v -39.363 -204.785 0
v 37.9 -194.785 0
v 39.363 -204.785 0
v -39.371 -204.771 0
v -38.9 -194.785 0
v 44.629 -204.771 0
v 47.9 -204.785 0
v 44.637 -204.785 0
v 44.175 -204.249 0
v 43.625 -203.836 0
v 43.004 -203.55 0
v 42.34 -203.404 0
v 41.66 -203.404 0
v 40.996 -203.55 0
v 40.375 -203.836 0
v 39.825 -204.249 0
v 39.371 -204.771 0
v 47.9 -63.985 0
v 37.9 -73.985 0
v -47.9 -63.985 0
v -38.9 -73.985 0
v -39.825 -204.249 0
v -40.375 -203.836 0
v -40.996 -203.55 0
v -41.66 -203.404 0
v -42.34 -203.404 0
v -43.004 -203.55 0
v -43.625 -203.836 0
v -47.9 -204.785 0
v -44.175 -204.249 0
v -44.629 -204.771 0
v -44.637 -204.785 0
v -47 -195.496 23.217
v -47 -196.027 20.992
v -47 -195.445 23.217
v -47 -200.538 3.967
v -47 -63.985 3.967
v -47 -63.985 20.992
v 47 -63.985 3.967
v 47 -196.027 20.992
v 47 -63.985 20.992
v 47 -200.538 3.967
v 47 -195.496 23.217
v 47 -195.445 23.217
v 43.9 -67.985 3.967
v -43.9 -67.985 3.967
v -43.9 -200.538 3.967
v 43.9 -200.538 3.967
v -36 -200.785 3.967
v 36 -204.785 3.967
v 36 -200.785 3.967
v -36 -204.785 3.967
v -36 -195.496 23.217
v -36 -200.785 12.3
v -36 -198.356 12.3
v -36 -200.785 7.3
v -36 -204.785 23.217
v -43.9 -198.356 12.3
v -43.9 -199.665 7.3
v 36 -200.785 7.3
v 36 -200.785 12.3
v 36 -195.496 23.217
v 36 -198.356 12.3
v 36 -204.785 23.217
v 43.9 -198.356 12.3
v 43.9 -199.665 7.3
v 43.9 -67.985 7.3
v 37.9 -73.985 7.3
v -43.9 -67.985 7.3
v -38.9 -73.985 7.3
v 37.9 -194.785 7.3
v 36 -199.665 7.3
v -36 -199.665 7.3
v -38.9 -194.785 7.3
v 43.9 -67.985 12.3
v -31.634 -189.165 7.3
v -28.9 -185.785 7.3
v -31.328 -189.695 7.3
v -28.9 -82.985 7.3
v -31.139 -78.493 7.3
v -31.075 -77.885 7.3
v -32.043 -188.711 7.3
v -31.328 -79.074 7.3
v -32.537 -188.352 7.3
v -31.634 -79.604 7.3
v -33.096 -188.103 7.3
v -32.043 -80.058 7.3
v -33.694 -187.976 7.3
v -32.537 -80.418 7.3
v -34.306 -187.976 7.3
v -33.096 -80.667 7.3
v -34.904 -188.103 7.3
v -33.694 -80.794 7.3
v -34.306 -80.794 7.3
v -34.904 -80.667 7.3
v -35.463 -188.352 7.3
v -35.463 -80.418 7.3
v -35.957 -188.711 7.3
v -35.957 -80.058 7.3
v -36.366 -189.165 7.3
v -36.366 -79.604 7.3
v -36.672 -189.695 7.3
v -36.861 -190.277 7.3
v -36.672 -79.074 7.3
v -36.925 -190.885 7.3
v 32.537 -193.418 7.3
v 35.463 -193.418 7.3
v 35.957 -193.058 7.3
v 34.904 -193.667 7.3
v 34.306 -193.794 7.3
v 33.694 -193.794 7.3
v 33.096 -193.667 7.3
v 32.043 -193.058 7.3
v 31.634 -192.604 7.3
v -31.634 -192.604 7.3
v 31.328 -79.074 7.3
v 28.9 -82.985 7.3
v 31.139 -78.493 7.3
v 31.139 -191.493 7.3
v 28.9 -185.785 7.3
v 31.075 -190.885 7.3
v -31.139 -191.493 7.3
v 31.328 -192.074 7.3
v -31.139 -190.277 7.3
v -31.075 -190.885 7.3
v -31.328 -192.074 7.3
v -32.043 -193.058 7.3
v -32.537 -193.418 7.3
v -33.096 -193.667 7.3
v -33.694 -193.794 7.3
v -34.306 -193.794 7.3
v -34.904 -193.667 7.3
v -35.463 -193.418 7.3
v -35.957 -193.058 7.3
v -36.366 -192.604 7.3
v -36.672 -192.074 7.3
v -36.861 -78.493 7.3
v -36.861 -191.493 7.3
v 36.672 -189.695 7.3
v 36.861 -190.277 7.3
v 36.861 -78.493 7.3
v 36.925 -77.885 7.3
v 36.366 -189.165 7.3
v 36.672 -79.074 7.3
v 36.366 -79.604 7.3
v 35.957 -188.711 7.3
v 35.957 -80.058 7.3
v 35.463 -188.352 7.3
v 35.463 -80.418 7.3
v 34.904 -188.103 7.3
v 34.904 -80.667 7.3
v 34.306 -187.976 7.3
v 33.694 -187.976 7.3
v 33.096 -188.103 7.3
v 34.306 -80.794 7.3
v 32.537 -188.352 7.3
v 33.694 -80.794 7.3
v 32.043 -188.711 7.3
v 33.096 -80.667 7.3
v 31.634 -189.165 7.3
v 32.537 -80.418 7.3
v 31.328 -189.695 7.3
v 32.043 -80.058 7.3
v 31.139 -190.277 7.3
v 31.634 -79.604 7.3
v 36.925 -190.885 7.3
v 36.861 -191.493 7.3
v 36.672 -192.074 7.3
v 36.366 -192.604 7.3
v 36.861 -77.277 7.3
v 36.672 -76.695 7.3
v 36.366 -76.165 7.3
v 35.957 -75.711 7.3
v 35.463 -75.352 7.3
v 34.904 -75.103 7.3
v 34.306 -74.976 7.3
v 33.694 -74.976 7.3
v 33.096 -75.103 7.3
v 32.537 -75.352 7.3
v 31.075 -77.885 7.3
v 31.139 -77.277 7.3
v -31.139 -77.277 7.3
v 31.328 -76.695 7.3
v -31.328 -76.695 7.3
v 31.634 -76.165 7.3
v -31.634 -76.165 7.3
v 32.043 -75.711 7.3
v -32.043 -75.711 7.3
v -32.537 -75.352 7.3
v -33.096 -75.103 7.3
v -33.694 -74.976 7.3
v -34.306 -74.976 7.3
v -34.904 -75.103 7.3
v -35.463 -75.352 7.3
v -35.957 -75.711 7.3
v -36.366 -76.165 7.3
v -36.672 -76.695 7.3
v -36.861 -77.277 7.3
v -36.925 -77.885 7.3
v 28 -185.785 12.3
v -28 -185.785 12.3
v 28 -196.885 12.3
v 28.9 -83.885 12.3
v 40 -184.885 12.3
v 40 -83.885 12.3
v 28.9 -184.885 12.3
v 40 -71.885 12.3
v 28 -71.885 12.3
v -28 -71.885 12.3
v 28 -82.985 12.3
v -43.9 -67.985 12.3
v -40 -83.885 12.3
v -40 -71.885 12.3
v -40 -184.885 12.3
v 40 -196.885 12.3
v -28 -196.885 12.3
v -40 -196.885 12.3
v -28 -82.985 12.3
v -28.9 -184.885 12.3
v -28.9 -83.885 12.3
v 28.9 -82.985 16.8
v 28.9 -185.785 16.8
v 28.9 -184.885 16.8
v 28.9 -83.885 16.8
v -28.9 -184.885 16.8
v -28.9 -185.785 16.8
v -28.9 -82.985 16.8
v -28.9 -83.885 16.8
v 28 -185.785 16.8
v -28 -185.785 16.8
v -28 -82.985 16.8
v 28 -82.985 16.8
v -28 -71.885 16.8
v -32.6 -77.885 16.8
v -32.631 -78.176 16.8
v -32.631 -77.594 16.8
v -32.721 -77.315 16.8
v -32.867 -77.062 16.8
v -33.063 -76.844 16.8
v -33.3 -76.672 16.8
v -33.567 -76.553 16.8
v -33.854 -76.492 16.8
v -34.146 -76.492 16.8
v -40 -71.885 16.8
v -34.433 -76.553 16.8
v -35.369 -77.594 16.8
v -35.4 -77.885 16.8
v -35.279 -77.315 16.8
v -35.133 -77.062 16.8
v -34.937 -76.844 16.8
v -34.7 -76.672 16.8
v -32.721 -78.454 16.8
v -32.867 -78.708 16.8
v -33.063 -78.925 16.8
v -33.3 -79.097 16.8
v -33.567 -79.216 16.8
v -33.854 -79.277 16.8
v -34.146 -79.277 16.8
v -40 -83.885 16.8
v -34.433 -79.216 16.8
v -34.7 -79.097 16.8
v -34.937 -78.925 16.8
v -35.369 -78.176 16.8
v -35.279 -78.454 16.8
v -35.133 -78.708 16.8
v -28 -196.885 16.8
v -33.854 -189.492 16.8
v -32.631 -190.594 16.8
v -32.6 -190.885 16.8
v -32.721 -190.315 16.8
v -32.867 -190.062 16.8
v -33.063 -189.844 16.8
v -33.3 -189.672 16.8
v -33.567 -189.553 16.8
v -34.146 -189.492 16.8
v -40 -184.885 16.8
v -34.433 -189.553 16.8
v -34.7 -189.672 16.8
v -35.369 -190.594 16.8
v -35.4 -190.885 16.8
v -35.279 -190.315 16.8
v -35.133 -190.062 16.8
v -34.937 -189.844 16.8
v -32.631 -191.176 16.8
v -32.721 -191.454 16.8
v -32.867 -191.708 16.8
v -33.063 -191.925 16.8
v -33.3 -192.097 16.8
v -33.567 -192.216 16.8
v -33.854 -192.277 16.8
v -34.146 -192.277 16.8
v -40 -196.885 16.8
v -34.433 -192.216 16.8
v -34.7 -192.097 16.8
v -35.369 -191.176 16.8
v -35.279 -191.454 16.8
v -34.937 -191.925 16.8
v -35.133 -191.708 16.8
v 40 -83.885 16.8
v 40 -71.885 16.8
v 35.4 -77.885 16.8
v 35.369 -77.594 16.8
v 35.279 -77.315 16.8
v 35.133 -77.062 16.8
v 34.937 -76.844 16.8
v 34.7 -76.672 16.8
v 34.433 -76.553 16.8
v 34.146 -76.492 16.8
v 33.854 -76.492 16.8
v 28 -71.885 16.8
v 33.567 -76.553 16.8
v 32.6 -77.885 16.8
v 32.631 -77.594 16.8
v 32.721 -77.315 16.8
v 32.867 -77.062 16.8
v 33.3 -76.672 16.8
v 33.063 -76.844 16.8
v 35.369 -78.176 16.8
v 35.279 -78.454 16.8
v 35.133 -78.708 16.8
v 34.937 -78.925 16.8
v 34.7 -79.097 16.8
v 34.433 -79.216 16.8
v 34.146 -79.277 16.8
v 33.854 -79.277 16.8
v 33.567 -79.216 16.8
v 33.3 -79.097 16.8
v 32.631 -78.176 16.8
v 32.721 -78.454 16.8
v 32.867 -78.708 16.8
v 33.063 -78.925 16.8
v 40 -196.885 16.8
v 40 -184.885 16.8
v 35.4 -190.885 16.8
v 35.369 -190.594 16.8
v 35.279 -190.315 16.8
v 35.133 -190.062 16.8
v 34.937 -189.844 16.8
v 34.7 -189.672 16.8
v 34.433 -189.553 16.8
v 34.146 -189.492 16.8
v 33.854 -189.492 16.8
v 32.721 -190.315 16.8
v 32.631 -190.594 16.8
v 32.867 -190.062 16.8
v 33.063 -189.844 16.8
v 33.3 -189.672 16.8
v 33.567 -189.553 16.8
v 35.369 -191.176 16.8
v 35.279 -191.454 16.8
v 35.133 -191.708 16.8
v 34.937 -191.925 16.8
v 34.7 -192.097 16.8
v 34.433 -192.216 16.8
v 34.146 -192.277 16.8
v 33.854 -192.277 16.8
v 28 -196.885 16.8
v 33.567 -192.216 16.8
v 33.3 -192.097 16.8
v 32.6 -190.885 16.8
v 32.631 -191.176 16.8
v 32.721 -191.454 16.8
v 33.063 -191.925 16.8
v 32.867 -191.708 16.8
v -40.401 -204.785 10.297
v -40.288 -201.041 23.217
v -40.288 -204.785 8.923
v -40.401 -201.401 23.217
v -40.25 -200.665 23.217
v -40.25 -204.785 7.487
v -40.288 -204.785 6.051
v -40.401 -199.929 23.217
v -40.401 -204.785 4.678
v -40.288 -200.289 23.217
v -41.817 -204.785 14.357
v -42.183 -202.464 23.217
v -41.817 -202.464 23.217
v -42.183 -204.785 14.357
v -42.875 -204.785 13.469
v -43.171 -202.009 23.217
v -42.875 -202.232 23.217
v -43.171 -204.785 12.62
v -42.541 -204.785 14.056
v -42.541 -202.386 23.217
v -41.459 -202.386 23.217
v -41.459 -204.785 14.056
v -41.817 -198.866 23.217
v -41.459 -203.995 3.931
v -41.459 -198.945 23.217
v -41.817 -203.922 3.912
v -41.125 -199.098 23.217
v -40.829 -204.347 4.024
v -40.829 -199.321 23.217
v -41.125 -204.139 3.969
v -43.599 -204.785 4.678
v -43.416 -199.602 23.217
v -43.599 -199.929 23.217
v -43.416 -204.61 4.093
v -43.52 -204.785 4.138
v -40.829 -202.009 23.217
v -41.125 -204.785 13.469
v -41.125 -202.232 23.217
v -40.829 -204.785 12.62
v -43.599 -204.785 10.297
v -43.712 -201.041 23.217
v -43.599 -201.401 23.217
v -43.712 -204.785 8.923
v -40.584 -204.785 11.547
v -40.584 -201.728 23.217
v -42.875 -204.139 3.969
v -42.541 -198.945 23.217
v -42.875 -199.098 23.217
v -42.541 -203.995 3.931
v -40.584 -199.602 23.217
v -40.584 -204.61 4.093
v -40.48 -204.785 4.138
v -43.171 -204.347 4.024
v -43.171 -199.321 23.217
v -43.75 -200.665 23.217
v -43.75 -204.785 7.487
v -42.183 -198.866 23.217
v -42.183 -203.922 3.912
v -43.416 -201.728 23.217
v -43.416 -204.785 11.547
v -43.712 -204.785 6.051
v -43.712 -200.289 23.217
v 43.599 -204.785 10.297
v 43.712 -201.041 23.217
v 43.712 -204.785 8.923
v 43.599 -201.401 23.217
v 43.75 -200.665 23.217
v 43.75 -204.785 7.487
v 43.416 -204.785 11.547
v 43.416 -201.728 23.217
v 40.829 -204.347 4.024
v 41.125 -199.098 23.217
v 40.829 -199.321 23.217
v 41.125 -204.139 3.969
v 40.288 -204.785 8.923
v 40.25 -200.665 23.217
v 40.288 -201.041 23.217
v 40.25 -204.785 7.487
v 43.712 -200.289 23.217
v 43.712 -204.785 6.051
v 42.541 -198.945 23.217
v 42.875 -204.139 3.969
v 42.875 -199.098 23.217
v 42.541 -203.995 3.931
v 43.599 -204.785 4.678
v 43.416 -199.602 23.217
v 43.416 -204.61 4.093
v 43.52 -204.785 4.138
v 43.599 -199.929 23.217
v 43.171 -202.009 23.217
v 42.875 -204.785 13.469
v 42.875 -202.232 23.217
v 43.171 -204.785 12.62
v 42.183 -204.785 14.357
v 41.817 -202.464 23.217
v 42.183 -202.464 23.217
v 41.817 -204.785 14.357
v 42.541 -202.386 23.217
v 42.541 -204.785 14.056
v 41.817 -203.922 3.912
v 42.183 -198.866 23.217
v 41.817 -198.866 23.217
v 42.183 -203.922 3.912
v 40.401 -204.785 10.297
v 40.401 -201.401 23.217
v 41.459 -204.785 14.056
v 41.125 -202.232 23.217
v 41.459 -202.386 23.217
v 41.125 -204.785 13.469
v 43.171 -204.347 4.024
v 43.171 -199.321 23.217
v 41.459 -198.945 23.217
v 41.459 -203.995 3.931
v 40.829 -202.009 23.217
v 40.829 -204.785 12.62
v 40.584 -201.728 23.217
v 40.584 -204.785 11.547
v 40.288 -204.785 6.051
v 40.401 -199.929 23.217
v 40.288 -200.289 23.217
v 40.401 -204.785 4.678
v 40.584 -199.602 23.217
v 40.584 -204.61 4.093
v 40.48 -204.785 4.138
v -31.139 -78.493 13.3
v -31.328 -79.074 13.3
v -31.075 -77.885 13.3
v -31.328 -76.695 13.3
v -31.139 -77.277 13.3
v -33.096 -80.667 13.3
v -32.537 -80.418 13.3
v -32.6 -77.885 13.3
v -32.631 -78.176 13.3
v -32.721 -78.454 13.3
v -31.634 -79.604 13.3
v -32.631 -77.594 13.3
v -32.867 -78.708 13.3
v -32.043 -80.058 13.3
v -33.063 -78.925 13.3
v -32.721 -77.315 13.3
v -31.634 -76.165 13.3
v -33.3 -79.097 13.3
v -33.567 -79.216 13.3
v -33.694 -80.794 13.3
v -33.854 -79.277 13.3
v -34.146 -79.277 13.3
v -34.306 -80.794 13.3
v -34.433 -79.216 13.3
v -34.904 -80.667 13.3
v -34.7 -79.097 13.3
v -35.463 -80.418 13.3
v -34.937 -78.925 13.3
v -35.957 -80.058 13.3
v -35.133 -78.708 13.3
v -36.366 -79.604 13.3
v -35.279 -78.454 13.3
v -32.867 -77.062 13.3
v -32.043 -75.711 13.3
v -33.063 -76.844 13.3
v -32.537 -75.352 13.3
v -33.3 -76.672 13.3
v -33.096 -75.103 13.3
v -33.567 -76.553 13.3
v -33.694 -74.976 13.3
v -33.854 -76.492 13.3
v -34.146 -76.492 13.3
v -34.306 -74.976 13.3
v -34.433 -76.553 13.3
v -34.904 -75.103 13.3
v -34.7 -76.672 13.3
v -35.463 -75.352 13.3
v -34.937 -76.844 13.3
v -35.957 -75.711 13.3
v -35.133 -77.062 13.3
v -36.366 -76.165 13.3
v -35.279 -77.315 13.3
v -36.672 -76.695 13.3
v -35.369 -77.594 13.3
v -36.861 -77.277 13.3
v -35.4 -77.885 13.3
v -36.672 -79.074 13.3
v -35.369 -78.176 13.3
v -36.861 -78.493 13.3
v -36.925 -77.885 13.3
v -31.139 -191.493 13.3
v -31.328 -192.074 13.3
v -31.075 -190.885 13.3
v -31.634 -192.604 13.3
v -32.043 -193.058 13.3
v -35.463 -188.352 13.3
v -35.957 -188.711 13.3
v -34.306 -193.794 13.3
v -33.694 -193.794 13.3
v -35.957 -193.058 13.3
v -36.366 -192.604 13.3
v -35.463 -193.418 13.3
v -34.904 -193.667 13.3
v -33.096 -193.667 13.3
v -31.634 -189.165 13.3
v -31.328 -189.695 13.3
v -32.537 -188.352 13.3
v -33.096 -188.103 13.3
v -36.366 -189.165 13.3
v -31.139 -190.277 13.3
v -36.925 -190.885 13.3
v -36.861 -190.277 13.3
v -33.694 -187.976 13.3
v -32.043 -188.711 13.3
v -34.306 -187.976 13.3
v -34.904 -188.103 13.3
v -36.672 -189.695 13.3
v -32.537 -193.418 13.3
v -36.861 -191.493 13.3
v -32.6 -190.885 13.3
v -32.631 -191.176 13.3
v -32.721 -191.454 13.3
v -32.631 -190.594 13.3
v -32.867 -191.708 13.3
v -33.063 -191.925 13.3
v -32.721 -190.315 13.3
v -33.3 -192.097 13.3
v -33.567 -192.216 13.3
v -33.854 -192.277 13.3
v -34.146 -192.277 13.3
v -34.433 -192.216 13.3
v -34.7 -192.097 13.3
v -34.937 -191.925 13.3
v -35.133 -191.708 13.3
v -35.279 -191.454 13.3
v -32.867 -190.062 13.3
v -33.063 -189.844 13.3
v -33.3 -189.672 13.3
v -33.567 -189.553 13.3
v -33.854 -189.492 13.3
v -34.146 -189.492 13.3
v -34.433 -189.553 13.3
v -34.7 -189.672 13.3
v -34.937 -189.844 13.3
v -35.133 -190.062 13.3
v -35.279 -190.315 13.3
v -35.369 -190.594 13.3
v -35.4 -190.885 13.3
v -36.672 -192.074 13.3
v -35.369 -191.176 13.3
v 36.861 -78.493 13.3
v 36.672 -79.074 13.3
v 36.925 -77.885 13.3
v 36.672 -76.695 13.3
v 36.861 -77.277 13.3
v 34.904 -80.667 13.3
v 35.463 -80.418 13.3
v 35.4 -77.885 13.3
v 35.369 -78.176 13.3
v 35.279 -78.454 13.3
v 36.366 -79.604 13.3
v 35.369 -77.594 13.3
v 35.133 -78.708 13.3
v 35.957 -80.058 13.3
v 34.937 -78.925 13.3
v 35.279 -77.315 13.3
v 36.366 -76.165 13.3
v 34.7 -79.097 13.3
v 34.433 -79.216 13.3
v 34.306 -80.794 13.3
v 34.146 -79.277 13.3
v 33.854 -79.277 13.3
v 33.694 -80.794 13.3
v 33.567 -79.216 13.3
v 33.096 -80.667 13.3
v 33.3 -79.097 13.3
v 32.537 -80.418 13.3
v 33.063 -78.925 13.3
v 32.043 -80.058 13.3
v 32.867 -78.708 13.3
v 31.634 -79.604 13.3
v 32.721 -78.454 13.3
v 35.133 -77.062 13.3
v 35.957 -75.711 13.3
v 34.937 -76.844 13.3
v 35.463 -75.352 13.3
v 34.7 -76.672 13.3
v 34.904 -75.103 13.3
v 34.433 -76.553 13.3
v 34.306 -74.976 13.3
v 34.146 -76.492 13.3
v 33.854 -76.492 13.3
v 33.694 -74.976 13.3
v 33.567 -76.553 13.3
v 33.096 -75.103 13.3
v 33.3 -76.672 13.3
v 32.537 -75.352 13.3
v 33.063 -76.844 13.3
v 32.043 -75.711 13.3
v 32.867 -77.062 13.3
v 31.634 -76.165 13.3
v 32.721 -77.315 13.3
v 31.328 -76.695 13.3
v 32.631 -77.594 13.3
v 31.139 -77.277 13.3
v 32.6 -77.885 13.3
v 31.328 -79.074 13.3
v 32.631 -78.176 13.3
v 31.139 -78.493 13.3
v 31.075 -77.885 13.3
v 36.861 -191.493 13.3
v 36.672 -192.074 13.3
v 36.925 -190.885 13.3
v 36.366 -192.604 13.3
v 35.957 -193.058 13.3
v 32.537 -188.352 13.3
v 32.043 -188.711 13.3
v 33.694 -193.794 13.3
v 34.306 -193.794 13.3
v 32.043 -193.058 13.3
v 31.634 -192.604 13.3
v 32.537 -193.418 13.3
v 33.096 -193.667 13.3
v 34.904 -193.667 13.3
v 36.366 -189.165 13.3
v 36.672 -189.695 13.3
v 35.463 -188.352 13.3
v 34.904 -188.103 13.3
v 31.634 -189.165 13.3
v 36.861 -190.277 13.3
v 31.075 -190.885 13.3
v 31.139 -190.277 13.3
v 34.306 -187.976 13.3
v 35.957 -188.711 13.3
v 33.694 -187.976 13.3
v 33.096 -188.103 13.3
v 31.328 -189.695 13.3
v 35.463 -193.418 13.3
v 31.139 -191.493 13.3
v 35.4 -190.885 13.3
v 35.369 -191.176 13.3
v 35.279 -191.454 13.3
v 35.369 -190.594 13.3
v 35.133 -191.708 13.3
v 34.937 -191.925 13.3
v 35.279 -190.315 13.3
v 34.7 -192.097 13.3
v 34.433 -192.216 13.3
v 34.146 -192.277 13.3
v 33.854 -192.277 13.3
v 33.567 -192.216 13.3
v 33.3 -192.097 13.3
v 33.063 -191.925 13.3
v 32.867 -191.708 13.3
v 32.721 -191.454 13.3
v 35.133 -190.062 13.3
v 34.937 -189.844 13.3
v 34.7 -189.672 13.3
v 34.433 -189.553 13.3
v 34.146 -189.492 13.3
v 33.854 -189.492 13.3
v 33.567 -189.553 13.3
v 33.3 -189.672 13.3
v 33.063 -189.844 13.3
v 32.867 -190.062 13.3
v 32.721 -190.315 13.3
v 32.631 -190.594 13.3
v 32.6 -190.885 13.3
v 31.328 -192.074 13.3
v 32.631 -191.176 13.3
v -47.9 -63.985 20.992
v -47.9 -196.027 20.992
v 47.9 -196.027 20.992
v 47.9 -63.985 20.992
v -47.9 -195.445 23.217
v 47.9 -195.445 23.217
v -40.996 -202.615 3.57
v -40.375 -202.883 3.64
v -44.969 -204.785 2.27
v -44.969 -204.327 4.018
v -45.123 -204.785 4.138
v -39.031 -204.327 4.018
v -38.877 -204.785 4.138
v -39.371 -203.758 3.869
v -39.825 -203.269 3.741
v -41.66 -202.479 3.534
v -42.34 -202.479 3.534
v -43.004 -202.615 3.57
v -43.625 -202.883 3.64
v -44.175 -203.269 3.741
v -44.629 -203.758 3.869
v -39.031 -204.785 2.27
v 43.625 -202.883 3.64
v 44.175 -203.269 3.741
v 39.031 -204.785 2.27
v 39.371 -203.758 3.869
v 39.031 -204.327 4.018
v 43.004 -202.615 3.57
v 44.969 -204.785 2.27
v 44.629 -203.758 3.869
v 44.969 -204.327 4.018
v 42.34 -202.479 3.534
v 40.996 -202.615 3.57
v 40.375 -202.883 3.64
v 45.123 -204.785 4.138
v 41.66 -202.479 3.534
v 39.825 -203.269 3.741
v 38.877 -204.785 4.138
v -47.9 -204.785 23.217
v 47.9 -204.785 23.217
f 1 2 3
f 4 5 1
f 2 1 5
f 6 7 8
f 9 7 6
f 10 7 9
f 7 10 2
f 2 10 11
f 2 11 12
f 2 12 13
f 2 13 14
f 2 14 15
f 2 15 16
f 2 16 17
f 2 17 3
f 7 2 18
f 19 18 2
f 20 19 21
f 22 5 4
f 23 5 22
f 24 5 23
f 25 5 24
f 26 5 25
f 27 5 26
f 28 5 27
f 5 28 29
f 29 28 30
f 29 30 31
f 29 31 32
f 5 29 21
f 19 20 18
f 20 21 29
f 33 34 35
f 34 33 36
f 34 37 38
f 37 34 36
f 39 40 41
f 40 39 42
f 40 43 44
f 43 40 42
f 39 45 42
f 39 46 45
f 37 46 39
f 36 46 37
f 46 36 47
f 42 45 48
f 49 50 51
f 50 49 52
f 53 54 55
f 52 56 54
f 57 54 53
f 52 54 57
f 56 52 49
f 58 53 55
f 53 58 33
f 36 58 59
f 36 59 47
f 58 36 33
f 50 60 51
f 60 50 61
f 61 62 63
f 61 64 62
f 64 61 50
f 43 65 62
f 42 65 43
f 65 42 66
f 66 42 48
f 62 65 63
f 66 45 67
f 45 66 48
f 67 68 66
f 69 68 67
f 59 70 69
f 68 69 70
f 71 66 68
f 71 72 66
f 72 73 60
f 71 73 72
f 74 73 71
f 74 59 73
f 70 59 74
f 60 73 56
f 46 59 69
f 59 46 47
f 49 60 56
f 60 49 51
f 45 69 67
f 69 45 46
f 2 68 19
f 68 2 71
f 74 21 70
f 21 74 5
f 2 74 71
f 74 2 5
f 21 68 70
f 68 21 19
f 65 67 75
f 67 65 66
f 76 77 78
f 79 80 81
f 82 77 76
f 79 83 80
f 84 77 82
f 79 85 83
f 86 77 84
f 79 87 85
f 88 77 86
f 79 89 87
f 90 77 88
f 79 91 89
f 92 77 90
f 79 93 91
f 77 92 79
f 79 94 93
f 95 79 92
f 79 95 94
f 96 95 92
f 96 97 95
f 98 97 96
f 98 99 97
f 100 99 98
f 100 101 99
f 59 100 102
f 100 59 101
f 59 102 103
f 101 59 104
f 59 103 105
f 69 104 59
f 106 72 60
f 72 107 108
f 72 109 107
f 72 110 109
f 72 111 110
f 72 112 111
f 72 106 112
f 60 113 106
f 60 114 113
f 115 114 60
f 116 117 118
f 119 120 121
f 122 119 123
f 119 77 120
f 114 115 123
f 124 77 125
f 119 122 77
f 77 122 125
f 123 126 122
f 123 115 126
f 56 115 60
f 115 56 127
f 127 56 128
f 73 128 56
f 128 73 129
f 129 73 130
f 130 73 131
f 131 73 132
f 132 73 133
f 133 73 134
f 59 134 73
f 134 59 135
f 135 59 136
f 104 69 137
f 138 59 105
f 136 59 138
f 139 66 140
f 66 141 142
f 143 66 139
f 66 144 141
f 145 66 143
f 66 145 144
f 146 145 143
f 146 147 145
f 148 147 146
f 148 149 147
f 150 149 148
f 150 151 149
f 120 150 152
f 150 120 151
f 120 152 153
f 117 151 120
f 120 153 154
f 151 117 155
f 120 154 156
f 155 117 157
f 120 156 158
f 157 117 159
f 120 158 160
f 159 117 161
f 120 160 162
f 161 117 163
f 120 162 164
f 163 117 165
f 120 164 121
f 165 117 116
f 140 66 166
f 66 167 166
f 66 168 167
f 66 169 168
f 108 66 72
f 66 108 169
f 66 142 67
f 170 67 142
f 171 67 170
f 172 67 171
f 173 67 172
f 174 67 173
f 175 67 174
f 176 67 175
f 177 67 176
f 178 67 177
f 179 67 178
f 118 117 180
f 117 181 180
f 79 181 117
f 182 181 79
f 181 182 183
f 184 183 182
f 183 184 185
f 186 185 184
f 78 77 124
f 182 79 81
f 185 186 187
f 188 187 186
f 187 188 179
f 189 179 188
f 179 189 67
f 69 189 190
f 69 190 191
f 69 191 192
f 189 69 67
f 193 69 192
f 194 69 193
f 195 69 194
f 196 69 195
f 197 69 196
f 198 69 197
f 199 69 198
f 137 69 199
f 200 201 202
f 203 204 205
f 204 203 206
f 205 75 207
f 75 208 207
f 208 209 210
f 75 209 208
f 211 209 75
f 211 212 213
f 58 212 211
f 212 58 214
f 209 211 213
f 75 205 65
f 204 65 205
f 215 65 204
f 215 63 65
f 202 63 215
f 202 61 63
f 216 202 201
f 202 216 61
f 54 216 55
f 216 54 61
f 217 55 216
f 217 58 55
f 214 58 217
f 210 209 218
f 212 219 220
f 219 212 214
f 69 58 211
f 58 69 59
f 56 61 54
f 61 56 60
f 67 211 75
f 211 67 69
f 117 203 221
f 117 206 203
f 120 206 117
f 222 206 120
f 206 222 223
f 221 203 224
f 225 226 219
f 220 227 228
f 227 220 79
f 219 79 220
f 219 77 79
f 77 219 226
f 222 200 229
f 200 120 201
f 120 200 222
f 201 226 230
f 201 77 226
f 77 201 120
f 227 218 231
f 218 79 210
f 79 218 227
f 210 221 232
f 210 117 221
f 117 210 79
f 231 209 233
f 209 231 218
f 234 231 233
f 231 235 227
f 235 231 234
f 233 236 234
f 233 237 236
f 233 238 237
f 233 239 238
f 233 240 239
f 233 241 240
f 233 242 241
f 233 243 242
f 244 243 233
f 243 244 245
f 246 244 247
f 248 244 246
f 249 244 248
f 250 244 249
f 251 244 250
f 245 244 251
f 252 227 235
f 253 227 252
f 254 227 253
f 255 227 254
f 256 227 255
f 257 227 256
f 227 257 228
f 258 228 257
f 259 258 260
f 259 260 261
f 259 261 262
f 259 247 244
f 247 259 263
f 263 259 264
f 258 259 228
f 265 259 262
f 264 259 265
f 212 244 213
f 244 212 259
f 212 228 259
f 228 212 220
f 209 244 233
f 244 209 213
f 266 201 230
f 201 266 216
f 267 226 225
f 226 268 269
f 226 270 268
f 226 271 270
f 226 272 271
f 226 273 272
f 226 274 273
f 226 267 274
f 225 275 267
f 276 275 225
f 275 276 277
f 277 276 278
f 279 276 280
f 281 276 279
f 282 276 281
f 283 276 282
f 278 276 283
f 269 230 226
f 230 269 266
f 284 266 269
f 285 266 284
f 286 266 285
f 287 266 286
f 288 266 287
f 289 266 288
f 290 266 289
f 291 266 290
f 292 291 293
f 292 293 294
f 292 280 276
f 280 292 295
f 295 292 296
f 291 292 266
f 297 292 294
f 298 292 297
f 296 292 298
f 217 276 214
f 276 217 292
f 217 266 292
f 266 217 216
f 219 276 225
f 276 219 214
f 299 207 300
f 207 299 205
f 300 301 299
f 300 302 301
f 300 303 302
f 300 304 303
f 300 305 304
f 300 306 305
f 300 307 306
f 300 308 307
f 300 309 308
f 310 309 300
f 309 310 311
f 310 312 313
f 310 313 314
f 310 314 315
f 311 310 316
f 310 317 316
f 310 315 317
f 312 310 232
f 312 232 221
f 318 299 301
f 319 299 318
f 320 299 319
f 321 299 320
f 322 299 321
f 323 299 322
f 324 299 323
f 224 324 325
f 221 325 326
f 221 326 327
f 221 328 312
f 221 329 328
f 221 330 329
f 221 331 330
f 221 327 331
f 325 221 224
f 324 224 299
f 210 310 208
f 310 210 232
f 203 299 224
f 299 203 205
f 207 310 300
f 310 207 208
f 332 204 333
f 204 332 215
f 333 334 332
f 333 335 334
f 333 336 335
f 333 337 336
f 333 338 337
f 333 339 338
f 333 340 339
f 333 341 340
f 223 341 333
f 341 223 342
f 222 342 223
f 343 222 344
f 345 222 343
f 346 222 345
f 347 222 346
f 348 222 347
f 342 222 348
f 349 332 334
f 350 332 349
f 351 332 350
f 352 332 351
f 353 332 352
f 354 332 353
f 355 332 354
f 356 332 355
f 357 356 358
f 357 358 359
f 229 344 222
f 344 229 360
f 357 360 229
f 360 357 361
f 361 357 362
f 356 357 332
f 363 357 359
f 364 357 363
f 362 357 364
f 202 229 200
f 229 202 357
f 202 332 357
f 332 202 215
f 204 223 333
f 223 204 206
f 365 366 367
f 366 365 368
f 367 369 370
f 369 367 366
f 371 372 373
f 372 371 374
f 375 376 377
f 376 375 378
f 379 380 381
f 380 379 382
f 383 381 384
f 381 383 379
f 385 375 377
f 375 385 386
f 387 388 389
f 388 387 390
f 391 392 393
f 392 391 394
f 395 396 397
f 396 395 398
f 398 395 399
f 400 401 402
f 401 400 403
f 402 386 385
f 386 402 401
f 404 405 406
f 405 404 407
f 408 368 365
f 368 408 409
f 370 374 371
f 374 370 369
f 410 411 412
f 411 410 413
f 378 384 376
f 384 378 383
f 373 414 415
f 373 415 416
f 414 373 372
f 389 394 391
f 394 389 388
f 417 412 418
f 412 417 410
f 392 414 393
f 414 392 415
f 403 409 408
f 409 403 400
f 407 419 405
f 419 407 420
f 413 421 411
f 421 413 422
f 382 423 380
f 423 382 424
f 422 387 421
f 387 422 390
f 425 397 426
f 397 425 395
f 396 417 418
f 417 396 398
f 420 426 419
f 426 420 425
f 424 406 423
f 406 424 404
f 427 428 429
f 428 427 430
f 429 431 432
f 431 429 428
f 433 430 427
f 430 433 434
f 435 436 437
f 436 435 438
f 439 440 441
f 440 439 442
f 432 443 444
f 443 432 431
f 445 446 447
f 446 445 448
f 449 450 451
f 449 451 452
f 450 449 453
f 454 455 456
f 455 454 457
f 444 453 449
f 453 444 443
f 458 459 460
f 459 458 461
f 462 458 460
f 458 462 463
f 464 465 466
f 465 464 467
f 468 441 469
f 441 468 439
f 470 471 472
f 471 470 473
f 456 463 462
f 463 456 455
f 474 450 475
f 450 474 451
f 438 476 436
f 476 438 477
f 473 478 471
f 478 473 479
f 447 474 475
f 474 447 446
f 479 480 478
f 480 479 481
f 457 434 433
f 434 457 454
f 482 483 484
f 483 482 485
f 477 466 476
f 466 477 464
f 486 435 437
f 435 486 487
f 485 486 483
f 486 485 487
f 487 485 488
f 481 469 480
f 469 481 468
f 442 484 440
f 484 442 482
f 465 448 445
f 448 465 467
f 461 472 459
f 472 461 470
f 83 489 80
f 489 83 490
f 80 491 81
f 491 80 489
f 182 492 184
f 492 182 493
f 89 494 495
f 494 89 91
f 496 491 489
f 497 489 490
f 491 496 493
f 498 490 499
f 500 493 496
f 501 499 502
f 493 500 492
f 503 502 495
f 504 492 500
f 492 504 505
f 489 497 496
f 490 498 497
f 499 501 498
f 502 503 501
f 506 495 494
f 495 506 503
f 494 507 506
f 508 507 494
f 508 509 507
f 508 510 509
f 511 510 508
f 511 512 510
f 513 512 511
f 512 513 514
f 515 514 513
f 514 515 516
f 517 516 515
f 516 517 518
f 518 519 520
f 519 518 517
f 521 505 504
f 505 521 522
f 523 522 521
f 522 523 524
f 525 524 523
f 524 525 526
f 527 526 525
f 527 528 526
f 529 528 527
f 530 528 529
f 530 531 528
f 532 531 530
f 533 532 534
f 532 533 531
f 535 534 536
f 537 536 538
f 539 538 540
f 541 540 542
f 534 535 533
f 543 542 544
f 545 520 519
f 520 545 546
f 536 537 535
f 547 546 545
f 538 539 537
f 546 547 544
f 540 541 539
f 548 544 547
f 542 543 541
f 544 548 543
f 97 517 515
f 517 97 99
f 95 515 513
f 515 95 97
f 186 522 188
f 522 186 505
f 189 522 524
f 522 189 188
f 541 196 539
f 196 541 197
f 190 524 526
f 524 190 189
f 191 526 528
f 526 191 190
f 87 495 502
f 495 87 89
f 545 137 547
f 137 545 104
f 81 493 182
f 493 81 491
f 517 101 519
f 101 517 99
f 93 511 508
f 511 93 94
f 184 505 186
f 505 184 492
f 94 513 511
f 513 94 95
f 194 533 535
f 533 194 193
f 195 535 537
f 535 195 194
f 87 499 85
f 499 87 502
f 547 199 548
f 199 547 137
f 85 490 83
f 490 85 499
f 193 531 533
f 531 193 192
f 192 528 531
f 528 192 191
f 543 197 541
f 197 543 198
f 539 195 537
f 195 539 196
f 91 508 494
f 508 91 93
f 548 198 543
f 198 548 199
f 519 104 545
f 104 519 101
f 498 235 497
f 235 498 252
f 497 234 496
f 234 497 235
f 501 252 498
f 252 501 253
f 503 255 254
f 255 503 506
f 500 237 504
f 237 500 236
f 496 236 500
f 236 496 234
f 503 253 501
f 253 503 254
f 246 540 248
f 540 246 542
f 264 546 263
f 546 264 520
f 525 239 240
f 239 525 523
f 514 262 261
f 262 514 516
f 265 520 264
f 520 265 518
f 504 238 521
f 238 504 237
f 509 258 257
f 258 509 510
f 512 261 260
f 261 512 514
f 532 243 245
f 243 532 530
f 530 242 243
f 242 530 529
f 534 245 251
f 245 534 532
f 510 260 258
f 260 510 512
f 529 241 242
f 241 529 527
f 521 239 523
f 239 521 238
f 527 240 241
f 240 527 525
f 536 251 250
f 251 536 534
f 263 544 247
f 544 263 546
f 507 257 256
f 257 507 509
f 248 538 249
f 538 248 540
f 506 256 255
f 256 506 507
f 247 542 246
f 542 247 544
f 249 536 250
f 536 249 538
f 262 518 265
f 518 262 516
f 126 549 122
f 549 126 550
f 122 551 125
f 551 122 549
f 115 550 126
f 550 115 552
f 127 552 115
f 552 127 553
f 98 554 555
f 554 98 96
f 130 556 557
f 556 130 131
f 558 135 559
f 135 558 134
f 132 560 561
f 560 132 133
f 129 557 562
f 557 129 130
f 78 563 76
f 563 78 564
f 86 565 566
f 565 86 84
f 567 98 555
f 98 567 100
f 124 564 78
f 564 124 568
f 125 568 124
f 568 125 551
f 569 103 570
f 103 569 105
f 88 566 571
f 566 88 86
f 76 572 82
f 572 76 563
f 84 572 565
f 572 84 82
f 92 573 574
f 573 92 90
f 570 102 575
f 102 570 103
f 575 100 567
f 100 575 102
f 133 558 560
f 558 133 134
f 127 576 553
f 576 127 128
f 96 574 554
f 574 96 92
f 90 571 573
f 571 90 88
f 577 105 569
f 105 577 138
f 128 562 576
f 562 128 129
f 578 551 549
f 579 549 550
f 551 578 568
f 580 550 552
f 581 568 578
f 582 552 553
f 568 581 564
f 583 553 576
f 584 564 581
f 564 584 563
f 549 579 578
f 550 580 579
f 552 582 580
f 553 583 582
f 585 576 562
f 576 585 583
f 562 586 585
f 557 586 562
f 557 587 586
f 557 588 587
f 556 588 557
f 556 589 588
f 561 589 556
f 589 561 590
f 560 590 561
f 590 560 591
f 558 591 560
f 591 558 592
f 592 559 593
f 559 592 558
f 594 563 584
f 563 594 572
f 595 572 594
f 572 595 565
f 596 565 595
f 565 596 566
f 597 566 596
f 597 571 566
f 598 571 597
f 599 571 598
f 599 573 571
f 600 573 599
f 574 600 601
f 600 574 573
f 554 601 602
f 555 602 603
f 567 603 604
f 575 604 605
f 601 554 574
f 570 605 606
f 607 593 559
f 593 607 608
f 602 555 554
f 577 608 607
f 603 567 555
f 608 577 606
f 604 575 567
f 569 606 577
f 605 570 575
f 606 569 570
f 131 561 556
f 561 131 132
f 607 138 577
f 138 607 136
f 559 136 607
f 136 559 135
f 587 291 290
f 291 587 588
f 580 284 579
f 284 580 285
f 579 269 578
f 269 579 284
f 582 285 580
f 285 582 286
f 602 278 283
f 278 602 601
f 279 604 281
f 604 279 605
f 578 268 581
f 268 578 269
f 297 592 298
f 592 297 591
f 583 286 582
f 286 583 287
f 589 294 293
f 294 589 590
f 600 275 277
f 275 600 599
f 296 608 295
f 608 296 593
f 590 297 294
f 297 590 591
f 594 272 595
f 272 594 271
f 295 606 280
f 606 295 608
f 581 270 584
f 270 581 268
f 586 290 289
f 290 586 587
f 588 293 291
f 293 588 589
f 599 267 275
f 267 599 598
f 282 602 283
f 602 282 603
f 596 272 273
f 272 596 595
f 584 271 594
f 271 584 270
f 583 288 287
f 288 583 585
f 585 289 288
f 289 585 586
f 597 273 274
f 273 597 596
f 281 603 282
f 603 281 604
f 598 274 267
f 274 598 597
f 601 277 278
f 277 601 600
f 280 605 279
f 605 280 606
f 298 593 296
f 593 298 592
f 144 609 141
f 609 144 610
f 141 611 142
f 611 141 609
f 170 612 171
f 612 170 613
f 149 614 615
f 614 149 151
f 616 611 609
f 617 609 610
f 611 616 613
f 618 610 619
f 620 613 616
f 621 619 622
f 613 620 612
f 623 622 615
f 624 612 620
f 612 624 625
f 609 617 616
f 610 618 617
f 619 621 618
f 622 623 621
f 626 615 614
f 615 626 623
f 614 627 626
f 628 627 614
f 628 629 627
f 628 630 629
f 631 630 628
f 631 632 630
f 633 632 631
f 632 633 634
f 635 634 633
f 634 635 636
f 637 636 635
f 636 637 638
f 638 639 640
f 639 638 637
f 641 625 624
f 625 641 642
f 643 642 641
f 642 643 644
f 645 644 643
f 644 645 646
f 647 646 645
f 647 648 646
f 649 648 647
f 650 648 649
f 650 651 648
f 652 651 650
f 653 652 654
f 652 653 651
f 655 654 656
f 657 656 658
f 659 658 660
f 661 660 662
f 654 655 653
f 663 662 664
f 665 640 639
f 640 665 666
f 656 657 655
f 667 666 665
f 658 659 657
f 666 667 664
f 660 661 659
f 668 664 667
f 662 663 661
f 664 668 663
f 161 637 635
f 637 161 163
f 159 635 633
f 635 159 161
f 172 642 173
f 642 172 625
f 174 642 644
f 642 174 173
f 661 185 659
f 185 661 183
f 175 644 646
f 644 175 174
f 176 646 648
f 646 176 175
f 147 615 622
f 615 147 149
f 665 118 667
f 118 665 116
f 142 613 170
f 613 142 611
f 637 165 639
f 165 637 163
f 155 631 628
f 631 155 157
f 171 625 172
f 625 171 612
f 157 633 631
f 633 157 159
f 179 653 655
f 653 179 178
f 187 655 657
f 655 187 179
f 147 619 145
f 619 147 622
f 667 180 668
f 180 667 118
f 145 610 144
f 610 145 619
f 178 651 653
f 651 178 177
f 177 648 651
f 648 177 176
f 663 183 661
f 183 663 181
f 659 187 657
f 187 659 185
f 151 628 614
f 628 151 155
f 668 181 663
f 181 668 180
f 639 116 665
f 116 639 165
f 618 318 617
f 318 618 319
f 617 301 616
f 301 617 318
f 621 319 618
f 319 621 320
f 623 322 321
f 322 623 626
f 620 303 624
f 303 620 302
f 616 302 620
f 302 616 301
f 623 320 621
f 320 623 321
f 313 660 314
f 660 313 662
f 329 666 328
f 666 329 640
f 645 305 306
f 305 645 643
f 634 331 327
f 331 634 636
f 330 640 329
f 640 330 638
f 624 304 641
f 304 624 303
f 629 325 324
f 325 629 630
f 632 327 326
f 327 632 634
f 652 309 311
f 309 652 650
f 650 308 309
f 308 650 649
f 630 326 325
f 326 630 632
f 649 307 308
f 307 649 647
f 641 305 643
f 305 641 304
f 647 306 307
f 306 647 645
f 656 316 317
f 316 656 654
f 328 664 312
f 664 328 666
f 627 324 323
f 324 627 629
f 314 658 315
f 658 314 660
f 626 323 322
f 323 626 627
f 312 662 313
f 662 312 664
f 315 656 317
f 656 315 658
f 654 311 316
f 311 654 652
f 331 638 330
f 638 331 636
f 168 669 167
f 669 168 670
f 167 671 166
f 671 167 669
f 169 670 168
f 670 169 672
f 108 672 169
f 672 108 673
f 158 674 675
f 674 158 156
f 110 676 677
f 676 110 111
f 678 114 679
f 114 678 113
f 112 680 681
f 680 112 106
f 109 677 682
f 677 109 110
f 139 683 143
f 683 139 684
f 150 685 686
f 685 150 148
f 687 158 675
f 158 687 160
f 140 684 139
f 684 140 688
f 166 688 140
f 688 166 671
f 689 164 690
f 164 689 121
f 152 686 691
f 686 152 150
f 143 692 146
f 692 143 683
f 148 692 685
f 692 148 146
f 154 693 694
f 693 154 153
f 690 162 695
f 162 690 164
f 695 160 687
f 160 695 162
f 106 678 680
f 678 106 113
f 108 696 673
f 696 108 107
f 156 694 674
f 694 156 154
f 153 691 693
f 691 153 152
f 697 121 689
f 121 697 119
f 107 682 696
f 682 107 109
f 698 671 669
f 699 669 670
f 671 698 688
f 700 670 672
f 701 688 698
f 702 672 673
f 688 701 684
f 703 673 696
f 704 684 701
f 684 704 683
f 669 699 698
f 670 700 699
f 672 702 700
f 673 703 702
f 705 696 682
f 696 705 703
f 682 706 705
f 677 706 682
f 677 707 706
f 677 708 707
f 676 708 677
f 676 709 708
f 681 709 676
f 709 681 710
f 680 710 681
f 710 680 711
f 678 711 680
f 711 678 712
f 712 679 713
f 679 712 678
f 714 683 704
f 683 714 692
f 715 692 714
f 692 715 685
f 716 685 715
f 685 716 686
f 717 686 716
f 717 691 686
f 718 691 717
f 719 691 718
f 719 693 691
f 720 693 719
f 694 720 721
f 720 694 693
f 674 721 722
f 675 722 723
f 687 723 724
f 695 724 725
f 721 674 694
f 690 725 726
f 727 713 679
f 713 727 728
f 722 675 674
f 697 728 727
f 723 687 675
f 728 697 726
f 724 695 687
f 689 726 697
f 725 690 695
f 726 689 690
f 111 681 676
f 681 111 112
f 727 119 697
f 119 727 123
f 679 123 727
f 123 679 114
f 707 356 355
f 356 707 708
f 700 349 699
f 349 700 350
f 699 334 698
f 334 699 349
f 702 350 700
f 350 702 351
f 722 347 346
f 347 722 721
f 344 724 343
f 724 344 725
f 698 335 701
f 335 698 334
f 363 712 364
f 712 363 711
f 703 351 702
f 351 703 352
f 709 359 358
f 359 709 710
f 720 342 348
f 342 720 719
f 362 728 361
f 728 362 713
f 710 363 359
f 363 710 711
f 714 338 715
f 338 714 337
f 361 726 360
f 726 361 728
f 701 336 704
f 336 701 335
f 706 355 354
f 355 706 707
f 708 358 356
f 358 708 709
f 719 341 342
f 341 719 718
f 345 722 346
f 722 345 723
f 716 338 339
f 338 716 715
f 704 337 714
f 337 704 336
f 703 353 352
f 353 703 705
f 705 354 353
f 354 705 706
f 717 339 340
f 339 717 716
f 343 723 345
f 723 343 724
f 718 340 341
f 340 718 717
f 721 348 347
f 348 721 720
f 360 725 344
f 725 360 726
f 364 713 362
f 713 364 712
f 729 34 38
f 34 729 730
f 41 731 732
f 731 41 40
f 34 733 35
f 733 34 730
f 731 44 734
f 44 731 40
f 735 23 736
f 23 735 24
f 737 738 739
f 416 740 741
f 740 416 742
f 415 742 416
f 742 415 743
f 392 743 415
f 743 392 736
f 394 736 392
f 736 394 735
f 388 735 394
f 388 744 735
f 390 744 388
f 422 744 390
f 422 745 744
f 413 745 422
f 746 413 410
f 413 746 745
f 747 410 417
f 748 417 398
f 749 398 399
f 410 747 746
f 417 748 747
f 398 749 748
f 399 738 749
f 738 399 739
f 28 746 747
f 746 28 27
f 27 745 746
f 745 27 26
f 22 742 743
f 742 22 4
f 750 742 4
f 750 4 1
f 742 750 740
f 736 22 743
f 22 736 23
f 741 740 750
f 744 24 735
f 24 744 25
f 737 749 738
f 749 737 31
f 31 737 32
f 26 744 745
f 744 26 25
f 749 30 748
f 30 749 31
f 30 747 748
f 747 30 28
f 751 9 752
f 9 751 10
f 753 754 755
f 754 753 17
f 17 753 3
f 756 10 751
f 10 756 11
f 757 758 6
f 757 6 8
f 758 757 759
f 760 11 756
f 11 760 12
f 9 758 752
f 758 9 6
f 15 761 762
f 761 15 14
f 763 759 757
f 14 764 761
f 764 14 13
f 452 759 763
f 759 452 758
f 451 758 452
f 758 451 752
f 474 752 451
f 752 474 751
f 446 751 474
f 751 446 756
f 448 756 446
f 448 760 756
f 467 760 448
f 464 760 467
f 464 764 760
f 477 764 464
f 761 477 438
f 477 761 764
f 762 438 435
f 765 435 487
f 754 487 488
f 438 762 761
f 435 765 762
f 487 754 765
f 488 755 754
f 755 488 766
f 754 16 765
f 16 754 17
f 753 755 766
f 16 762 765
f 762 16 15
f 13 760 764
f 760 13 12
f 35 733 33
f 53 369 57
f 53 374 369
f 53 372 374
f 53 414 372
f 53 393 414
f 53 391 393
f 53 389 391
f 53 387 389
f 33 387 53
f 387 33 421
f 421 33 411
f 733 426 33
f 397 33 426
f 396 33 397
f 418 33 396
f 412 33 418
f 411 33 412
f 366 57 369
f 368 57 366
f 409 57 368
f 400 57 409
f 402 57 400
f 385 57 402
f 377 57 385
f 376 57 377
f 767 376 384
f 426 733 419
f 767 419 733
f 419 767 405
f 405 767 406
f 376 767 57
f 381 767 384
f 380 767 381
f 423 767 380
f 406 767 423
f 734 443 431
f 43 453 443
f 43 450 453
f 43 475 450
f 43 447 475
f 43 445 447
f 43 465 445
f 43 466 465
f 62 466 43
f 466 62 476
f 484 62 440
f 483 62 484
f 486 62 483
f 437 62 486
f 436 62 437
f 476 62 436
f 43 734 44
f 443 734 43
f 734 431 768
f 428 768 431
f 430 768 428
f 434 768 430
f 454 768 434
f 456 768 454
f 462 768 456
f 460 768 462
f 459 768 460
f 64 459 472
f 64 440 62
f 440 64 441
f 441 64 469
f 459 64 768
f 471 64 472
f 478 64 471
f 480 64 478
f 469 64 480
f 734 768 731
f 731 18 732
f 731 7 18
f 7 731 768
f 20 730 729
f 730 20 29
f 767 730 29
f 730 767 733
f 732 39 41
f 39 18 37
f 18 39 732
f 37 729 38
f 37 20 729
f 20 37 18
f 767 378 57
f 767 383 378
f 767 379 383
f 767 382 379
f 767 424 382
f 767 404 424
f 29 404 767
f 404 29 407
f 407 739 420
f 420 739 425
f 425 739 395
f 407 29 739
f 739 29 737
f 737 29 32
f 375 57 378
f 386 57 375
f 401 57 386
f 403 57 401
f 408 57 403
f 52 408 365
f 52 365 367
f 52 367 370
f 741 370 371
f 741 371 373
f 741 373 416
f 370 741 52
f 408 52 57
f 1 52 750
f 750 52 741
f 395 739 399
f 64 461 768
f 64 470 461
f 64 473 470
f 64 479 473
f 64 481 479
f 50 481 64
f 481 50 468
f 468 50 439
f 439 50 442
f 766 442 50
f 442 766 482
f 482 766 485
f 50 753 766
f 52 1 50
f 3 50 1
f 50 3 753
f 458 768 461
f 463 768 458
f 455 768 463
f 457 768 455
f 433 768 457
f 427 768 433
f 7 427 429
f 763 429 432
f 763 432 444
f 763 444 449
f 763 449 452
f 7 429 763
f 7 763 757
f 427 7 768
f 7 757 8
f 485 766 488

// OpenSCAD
include <main.scad>

// Override render_part so main.scad doesn't render the full case
render_part = -1;

// Calculate the exact distance from the front edge to the pocket center along the sloped face
dist_y = face_cy - p2_front_top[0];
dist_z = face_cz - p2_front_top[1];
face_distance = sqrt(dist_y*dist_y + dist_z*dist_z);

// A bounding box to isolate just the screen mounting pocket
// We add 20mm padding to capture the full balcony, corner blocks, and some surrounding shell
test_box_w = screen_w + 20;
test_box_l = screen_l + 20;
test_box_h = 40; 

// Generate the flat test piece for quick 3D printing
intersection() {
    // 1. The flat top case (identical to render_part == 1 in main.scad)
    // The rotate([180,0,0]) flips it face-down, so the pocket center Y is negated.
    rotate([180, 0, 0])
    rotate([-face_angle, 0, 0])
    translate([0, -p2_front_top[0], -p2_front_top[1]])
    case_top();
    
    // 2. The isolation bounding box
    // Centered exactly on the screen pocket. 
    // Z is centered at test_box_h/2 - 5 so the box spans Z = -5 to Z = 35.
    // The faceplate skin rests exactly at Z=0, so this perfectly captures all features without clipping.
    translate([0, -face_distance, test_box_h/2 - 5]) 
    cube([test_box_w, test_box_l, test_box_h], center=true);
}
